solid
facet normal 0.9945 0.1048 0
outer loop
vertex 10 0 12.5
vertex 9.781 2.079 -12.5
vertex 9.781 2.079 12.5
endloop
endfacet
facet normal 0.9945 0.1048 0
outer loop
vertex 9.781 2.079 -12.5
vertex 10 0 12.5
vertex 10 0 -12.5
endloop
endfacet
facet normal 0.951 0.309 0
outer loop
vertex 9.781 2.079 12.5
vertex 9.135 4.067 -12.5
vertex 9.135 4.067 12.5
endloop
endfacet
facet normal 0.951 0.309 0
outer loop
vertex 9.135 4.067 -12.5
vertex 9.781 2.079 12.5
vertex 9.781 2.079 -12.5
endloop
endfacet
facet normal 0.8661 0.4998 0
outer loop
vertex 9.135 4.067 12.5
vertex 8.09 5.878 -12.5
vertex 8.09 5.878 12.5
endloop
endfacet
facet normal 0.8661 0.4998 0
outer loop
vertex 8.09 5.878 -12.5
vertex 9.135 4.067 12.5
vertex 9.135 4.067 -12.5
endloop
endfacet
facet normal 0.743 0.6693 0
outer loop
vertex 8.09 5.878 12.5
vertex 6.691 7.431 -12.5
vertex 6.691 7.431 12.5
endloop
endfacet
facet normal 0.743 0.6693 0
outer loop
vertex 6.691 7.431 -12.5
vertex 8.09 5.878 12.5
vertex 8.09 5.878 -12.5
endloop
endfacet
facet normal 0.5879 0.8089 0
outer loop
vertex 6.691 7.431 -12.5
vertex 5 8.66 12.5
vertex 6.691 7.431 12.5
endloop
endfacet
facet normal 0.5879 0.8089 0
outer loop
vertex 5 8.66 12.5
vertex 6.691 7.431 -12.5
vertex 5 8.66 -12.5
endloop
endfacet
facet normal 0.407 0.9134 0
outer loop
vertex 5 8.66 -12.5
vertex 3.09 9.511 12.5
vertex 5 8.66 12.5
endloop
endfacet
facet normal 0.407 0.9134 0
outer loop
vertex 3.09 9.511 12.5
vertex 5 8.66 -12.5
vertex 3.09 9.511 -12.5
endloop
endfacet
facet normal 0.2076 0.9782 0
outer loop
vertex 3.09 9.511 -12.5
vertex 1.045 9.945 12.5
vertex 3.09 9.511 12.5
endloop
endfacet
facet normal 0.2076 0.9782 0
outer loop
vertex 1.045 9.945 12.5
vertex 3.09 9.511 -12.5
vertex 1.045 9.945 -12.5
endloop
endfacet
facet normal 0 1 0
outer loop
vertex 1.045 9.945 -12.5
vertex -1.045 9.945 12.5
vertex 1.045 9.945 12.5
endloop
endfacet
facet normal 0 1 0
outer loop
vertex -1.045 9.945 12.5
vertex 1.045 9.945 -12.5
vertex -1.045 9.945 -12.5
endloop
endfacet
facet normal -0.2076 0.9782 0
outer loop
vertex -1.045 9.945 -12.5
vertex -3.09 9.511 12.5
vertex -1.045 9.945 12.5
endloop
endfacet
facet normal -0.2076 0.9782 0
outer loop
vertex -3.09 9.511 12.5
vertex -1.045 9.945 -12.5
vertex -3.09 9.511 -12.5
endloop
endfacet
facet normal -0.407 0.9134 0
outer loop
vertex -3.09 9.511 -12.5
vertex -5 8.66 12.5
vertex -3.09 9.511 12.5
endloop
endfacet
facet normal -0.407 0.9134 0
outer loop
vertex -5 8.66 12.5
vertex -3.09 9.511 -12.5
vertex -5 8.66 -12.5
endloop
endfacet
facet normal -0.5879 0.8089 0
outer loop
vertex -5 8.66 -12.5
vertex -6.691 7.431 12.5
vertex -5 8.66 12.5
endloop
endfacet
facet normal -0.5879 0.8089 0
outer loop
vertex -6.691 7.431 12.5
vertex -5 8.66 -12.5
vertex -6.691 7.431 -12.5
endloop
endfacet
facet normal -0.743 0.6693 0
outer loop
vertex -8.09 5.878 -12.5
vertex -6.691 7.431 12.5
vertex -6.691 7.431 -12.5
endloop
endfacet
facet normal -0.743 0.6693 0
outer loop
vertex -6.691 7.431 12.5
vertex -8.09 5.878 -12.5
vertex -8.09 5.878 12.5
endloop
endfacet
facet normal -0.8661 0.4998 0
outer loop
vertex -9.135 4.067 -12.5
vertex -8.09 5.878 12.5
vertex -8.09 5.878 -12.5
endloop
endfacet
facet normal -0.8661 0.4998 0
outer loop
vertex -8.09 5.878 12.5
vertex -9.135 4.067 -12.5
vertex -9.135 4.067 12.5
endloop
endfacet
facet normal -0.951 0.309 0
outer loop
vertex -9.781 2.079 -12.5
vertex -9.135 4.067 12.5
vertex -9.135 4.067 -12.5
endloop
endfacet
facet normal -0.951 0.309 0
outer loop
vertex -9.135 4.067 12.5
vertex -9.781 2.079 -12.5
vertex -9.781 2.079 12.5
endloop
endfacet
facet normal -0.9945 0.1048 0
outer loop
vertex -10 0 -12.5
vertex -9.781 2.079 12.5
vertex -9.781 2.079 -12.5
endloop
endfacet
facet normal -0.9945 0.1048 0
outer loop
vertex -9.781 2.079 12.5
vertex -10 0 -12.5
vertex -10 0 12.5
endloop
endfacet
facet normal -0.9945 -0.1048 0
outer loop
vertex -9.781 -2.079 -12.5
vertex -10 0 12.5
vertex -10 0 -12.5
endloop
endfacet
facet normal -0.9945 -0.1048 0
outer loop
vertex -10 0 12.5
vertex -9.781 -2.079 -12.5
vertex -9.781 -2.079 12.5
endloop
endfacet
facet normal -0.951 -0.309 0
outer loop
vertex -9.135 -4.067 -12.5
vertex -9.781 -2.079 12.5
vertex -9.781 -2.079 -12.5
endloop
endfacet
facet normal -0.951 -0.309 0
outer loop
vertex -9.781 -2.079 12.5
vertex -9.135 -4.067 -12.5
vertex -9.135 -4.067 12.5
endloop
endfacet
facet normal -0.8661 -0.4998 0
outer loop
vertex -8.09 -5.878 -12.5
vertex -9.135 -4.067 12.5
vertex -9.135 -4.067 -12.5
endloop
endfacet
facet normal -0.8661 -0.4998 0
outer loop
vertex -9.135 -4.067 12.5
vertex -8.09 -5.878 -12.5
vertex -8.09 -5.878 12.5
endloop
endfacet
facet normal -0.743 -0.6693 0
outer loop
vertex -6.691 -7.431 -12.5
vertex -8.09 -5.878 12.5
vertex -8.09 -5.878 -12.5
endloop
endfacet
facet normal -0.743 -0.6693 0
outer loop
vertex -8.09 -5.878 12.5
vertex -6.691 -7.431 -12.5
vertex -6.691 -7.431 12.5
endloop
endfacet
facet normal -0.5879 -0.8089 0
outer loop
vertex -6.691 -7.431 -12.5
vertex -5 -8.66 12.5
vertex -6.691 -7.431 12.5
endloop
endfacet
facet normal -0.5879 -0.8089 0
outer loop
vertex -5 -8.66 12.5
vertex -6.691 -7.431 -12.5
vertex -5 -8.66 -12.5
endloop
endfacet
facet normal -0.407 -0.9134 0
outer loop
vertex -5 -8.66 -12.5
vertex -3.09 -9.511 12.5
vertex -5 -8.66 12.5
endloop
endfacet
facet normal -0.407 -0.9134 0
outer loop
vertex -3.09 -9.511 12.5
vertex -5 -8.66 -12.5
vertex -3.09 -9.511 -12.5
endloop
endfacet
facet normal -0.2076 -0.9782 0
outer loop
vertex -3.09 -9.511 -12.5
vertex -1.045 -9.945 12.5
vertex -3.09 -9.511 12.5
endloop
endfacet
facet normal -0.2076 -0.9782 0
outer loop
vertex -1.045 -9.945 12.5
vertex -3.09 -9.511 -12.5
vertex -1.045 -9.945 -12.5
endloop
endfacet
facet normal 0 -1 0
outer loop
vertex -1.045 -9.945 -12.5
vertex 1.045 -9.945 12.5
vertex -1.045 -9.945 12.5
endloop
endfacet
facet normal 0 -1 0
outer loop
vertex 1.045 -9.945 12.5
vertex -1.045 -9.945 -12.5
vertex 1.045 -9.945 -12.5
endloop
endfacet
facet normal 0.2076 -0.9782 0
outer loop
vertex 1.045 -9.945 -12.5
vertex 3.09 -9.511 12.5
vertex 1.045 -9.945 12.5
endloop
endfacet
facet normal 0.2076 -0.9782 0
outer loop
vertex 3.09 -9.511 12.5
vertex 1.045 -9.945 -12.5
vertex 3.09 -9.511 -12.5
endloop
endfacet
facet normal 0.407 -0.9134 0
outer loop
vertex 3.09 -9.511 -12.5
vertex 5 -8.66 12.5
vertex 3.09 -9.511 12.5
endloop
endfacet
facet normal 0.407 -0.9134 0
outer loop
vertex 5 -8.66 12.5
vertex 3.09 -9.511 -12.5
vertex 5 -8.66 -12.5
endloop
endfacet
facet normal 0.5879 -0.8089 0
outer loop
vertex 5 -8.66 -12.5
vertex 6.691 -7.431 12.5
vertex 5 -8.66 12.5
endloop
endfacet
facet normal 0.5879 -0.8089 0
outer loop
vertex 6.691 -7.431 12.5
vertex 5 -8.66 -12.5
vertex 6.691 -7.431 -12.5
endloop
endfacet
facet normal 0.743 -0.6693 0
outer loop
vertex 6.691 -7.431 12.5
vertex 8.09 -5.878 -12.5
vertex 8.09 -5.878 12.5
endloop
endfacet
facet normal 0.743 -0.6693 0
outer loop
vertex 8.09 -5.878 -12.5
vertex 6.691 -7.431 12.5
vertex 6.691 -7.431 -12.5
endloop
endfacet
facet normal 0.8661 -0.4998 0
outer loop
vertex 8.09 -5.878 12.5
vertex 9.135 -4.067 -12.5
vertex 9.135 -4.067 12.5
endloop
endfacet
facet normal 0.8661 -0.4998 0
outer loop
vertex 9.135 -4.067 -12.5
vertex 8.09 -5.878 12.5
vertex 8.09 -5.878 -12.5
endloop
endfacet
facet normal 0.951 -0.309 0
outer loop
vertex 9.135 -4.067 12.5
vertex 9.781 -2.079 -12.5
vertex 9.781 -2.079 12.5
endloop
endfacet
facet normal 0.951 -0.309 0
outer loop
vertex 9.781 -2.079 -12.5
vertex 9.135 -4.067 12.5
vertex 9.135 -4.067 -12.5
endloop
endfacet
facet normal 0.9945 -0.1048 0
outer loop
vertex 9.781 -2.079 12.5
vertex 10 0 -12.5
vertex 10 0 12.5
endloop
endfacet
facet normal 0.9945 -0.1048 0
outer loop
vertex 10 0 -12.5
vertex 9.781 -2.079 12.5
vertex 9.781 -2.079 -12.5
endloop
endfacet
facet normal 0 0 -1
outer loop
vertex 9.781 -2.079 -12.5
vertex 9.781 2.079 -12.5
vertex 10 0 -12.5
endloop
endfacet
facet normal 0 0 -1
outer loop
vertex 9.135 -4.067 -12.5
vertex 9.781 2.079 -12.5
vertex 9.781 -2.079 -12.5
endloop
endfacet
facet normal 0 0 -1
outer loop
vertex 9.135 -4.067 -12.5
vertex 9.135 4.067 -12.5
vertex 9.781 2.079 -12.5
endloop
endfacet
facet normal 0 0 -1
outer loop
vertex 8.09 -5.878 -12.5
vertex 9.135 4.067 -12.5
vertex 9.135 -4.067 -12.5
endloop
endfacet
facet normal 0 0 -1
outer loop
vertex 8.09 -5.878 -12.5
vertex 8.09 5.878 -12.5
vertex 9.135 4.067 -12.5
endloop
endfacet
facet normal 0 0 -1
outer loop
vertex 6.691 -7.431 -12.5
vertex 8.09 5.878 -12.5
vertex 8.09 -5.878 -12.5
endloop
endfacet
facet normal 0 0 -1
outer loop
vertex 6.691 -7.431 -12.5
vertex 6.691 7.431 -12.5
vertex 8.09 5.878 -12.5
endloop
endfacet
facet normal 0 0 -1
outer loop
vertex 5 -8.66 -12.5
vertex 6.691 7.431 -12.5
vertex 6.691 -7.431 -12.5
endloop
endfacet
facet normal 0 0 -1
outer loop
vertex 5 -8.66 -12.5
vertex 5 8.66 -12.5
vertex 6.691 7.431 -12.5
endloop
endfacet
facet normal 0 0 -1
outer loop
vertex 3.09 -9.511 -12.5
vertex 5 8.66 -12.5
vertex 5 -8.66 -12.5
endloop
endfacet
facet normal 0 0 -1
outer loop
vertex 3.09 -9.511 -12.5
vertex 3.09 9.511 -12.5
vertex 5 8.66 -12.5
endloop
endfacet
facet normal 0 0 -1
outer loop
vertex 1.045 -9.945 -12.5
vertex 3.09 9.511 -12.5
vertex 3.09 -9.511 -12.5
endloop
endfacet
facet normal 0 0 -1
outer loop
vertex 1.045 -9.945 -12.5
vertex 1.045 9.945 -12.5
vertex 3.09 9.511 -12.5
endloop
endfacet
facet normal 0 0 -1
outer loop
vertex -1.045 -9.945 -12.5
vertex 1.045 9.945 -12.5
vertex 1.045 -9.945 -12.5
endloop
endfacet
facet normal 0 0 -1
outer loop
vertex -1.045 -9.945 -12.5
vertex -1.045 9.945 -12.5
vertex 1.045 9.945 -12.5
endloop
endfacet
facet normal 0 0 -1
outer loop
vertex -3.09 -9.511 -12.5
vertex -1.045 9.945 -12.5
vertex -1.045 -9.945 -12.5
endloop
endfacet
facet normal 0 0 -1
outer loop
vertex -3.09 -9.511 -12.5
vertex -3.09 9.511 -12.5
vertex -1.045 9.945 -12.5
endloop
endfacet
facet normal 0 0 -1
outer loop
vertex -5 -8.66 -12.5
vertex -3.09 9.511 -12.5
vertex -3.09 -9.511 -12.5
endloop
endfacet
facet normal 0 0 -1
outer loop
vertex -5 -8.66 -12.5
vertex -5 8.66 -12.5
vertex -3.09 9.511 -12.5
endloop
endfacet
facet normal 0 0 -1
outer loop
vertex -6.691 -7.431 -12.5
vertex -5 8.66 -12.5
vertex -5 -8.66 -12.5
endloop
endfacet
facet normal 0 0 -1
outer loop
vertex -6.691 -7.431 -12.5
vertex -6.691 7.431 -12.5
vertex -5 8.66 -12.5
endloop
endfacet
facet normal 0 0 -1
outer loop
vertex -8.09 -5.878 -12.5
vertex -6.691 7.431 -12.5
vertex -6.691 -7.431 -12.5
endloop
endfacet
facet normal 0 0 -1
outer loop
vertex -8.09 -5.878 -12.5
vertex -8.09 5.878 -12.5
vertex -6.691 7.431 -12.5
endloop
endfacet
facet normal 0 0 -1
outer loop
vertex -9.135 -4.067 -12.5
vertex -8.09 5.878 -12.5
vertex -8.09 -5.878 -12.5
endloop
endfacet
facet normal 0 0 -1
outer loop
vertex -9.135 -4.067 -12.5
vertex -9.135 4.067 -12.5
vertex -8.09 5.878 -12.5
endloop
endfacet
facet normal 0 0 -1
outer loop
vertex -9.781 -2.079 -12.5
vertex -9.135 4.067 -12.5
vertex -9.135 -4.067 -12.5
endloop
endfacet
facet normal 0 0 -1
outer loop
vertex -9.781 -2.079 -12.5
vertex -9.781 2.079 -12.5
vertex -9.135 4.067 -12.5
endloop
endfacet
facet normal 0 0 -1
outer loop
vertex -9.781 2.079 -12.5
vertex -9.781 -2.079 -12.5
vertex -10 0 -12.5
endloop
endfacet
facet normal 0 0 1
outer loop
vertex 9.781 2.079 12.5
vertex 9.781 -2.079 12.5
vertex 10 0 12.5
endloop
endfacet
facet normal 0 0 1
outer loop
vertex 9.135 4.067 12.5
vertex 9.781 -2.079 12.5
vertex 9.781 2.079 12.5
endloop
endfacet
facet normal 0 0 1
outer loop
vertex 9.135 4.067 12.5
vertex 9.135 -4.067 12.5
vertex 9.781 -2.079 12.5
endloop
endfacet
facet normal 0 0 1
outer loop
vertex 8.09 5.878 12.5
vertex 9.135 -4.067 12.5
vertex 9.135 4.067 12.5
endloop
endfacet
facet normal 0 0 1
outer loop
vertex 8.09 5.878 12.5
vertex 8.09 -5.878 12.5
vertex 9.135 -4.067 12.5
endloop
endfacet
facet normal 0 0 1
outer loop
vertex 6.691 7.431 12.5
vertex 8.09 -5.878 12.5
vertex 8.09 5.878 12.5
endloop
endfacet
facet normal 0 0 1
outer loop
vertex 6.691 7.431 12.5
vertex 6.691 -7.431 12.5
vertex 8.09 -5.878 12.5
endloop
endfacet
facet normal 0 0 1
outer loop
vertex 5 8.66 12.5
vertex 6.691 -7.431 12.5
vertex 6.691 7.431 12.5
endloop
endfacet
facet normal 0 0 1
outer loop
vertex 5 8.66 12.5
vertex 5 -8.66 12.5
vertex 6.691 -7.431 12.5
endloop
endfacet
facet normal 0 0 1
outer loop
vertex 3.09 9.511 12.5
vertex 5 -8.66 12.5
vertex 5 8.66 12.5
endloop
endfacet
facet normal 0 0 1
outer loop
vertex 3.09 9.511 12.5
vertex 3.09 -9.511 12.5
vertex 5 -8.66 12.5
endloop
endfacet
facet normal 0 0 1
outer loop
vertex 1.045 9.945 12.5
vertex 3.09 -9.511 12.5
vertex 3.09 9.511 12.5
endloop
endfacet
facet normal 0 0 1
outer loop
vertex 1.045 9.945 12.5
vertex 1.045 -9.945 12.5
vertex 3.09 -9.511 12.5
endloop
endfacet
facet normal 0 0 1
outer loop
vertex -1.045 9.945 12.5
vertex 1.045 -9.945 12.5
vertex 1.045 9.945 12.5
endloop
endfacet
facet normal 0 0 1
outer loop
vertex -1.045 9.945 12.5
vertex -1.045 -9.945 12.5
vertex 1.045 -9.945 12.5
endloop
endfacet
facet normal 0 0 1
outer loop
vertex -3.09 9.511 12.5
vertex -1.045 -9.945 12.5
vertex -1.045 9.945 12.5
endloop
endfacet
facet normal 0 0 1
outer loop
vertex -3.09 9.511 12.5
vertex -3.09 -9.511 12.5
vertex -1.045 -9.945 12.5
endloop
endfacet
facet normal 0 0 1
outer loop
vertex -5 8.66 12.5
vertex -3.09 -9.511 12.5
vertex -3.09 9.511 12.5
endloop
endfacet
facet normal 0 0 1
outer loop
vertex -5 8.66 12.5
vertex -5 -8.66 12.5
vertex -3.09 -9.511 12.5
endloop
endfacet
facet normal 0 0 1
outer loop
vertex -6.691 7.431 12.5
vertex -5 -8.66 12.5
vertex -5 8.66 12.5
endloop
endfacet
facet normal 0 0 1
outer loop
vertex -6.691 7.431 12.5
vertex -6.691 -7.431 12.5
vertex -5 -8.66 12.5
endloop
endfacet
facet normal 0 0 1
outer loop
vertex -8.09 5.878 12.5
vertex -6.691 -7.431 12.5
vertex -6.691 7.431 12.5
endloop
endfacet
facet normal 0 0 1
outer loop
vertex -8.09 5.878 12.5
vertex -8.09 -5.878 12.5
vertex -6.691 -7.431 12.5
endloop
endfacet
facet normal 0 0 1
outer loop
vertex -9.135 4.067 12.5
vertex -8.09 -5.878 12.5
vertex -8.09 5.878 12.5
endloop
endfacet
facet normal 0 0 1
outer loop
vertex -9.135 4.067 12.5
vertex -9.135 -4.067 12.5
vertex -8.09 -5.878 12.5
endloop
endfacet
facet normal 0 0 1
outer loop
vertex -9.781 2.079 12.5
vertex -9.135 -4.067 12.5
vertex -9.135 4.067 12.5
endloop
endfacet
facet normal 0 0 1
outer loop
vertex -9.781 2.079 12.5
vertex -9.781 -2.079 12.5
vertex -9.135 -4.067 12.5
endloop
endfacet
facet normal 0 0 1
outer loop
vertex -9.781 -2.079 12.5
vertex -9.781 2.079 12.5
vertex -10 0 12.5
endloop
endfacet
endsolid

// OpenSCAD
// Generated by generate_scads.py
cylinder(h=25, r=10, center=true);
